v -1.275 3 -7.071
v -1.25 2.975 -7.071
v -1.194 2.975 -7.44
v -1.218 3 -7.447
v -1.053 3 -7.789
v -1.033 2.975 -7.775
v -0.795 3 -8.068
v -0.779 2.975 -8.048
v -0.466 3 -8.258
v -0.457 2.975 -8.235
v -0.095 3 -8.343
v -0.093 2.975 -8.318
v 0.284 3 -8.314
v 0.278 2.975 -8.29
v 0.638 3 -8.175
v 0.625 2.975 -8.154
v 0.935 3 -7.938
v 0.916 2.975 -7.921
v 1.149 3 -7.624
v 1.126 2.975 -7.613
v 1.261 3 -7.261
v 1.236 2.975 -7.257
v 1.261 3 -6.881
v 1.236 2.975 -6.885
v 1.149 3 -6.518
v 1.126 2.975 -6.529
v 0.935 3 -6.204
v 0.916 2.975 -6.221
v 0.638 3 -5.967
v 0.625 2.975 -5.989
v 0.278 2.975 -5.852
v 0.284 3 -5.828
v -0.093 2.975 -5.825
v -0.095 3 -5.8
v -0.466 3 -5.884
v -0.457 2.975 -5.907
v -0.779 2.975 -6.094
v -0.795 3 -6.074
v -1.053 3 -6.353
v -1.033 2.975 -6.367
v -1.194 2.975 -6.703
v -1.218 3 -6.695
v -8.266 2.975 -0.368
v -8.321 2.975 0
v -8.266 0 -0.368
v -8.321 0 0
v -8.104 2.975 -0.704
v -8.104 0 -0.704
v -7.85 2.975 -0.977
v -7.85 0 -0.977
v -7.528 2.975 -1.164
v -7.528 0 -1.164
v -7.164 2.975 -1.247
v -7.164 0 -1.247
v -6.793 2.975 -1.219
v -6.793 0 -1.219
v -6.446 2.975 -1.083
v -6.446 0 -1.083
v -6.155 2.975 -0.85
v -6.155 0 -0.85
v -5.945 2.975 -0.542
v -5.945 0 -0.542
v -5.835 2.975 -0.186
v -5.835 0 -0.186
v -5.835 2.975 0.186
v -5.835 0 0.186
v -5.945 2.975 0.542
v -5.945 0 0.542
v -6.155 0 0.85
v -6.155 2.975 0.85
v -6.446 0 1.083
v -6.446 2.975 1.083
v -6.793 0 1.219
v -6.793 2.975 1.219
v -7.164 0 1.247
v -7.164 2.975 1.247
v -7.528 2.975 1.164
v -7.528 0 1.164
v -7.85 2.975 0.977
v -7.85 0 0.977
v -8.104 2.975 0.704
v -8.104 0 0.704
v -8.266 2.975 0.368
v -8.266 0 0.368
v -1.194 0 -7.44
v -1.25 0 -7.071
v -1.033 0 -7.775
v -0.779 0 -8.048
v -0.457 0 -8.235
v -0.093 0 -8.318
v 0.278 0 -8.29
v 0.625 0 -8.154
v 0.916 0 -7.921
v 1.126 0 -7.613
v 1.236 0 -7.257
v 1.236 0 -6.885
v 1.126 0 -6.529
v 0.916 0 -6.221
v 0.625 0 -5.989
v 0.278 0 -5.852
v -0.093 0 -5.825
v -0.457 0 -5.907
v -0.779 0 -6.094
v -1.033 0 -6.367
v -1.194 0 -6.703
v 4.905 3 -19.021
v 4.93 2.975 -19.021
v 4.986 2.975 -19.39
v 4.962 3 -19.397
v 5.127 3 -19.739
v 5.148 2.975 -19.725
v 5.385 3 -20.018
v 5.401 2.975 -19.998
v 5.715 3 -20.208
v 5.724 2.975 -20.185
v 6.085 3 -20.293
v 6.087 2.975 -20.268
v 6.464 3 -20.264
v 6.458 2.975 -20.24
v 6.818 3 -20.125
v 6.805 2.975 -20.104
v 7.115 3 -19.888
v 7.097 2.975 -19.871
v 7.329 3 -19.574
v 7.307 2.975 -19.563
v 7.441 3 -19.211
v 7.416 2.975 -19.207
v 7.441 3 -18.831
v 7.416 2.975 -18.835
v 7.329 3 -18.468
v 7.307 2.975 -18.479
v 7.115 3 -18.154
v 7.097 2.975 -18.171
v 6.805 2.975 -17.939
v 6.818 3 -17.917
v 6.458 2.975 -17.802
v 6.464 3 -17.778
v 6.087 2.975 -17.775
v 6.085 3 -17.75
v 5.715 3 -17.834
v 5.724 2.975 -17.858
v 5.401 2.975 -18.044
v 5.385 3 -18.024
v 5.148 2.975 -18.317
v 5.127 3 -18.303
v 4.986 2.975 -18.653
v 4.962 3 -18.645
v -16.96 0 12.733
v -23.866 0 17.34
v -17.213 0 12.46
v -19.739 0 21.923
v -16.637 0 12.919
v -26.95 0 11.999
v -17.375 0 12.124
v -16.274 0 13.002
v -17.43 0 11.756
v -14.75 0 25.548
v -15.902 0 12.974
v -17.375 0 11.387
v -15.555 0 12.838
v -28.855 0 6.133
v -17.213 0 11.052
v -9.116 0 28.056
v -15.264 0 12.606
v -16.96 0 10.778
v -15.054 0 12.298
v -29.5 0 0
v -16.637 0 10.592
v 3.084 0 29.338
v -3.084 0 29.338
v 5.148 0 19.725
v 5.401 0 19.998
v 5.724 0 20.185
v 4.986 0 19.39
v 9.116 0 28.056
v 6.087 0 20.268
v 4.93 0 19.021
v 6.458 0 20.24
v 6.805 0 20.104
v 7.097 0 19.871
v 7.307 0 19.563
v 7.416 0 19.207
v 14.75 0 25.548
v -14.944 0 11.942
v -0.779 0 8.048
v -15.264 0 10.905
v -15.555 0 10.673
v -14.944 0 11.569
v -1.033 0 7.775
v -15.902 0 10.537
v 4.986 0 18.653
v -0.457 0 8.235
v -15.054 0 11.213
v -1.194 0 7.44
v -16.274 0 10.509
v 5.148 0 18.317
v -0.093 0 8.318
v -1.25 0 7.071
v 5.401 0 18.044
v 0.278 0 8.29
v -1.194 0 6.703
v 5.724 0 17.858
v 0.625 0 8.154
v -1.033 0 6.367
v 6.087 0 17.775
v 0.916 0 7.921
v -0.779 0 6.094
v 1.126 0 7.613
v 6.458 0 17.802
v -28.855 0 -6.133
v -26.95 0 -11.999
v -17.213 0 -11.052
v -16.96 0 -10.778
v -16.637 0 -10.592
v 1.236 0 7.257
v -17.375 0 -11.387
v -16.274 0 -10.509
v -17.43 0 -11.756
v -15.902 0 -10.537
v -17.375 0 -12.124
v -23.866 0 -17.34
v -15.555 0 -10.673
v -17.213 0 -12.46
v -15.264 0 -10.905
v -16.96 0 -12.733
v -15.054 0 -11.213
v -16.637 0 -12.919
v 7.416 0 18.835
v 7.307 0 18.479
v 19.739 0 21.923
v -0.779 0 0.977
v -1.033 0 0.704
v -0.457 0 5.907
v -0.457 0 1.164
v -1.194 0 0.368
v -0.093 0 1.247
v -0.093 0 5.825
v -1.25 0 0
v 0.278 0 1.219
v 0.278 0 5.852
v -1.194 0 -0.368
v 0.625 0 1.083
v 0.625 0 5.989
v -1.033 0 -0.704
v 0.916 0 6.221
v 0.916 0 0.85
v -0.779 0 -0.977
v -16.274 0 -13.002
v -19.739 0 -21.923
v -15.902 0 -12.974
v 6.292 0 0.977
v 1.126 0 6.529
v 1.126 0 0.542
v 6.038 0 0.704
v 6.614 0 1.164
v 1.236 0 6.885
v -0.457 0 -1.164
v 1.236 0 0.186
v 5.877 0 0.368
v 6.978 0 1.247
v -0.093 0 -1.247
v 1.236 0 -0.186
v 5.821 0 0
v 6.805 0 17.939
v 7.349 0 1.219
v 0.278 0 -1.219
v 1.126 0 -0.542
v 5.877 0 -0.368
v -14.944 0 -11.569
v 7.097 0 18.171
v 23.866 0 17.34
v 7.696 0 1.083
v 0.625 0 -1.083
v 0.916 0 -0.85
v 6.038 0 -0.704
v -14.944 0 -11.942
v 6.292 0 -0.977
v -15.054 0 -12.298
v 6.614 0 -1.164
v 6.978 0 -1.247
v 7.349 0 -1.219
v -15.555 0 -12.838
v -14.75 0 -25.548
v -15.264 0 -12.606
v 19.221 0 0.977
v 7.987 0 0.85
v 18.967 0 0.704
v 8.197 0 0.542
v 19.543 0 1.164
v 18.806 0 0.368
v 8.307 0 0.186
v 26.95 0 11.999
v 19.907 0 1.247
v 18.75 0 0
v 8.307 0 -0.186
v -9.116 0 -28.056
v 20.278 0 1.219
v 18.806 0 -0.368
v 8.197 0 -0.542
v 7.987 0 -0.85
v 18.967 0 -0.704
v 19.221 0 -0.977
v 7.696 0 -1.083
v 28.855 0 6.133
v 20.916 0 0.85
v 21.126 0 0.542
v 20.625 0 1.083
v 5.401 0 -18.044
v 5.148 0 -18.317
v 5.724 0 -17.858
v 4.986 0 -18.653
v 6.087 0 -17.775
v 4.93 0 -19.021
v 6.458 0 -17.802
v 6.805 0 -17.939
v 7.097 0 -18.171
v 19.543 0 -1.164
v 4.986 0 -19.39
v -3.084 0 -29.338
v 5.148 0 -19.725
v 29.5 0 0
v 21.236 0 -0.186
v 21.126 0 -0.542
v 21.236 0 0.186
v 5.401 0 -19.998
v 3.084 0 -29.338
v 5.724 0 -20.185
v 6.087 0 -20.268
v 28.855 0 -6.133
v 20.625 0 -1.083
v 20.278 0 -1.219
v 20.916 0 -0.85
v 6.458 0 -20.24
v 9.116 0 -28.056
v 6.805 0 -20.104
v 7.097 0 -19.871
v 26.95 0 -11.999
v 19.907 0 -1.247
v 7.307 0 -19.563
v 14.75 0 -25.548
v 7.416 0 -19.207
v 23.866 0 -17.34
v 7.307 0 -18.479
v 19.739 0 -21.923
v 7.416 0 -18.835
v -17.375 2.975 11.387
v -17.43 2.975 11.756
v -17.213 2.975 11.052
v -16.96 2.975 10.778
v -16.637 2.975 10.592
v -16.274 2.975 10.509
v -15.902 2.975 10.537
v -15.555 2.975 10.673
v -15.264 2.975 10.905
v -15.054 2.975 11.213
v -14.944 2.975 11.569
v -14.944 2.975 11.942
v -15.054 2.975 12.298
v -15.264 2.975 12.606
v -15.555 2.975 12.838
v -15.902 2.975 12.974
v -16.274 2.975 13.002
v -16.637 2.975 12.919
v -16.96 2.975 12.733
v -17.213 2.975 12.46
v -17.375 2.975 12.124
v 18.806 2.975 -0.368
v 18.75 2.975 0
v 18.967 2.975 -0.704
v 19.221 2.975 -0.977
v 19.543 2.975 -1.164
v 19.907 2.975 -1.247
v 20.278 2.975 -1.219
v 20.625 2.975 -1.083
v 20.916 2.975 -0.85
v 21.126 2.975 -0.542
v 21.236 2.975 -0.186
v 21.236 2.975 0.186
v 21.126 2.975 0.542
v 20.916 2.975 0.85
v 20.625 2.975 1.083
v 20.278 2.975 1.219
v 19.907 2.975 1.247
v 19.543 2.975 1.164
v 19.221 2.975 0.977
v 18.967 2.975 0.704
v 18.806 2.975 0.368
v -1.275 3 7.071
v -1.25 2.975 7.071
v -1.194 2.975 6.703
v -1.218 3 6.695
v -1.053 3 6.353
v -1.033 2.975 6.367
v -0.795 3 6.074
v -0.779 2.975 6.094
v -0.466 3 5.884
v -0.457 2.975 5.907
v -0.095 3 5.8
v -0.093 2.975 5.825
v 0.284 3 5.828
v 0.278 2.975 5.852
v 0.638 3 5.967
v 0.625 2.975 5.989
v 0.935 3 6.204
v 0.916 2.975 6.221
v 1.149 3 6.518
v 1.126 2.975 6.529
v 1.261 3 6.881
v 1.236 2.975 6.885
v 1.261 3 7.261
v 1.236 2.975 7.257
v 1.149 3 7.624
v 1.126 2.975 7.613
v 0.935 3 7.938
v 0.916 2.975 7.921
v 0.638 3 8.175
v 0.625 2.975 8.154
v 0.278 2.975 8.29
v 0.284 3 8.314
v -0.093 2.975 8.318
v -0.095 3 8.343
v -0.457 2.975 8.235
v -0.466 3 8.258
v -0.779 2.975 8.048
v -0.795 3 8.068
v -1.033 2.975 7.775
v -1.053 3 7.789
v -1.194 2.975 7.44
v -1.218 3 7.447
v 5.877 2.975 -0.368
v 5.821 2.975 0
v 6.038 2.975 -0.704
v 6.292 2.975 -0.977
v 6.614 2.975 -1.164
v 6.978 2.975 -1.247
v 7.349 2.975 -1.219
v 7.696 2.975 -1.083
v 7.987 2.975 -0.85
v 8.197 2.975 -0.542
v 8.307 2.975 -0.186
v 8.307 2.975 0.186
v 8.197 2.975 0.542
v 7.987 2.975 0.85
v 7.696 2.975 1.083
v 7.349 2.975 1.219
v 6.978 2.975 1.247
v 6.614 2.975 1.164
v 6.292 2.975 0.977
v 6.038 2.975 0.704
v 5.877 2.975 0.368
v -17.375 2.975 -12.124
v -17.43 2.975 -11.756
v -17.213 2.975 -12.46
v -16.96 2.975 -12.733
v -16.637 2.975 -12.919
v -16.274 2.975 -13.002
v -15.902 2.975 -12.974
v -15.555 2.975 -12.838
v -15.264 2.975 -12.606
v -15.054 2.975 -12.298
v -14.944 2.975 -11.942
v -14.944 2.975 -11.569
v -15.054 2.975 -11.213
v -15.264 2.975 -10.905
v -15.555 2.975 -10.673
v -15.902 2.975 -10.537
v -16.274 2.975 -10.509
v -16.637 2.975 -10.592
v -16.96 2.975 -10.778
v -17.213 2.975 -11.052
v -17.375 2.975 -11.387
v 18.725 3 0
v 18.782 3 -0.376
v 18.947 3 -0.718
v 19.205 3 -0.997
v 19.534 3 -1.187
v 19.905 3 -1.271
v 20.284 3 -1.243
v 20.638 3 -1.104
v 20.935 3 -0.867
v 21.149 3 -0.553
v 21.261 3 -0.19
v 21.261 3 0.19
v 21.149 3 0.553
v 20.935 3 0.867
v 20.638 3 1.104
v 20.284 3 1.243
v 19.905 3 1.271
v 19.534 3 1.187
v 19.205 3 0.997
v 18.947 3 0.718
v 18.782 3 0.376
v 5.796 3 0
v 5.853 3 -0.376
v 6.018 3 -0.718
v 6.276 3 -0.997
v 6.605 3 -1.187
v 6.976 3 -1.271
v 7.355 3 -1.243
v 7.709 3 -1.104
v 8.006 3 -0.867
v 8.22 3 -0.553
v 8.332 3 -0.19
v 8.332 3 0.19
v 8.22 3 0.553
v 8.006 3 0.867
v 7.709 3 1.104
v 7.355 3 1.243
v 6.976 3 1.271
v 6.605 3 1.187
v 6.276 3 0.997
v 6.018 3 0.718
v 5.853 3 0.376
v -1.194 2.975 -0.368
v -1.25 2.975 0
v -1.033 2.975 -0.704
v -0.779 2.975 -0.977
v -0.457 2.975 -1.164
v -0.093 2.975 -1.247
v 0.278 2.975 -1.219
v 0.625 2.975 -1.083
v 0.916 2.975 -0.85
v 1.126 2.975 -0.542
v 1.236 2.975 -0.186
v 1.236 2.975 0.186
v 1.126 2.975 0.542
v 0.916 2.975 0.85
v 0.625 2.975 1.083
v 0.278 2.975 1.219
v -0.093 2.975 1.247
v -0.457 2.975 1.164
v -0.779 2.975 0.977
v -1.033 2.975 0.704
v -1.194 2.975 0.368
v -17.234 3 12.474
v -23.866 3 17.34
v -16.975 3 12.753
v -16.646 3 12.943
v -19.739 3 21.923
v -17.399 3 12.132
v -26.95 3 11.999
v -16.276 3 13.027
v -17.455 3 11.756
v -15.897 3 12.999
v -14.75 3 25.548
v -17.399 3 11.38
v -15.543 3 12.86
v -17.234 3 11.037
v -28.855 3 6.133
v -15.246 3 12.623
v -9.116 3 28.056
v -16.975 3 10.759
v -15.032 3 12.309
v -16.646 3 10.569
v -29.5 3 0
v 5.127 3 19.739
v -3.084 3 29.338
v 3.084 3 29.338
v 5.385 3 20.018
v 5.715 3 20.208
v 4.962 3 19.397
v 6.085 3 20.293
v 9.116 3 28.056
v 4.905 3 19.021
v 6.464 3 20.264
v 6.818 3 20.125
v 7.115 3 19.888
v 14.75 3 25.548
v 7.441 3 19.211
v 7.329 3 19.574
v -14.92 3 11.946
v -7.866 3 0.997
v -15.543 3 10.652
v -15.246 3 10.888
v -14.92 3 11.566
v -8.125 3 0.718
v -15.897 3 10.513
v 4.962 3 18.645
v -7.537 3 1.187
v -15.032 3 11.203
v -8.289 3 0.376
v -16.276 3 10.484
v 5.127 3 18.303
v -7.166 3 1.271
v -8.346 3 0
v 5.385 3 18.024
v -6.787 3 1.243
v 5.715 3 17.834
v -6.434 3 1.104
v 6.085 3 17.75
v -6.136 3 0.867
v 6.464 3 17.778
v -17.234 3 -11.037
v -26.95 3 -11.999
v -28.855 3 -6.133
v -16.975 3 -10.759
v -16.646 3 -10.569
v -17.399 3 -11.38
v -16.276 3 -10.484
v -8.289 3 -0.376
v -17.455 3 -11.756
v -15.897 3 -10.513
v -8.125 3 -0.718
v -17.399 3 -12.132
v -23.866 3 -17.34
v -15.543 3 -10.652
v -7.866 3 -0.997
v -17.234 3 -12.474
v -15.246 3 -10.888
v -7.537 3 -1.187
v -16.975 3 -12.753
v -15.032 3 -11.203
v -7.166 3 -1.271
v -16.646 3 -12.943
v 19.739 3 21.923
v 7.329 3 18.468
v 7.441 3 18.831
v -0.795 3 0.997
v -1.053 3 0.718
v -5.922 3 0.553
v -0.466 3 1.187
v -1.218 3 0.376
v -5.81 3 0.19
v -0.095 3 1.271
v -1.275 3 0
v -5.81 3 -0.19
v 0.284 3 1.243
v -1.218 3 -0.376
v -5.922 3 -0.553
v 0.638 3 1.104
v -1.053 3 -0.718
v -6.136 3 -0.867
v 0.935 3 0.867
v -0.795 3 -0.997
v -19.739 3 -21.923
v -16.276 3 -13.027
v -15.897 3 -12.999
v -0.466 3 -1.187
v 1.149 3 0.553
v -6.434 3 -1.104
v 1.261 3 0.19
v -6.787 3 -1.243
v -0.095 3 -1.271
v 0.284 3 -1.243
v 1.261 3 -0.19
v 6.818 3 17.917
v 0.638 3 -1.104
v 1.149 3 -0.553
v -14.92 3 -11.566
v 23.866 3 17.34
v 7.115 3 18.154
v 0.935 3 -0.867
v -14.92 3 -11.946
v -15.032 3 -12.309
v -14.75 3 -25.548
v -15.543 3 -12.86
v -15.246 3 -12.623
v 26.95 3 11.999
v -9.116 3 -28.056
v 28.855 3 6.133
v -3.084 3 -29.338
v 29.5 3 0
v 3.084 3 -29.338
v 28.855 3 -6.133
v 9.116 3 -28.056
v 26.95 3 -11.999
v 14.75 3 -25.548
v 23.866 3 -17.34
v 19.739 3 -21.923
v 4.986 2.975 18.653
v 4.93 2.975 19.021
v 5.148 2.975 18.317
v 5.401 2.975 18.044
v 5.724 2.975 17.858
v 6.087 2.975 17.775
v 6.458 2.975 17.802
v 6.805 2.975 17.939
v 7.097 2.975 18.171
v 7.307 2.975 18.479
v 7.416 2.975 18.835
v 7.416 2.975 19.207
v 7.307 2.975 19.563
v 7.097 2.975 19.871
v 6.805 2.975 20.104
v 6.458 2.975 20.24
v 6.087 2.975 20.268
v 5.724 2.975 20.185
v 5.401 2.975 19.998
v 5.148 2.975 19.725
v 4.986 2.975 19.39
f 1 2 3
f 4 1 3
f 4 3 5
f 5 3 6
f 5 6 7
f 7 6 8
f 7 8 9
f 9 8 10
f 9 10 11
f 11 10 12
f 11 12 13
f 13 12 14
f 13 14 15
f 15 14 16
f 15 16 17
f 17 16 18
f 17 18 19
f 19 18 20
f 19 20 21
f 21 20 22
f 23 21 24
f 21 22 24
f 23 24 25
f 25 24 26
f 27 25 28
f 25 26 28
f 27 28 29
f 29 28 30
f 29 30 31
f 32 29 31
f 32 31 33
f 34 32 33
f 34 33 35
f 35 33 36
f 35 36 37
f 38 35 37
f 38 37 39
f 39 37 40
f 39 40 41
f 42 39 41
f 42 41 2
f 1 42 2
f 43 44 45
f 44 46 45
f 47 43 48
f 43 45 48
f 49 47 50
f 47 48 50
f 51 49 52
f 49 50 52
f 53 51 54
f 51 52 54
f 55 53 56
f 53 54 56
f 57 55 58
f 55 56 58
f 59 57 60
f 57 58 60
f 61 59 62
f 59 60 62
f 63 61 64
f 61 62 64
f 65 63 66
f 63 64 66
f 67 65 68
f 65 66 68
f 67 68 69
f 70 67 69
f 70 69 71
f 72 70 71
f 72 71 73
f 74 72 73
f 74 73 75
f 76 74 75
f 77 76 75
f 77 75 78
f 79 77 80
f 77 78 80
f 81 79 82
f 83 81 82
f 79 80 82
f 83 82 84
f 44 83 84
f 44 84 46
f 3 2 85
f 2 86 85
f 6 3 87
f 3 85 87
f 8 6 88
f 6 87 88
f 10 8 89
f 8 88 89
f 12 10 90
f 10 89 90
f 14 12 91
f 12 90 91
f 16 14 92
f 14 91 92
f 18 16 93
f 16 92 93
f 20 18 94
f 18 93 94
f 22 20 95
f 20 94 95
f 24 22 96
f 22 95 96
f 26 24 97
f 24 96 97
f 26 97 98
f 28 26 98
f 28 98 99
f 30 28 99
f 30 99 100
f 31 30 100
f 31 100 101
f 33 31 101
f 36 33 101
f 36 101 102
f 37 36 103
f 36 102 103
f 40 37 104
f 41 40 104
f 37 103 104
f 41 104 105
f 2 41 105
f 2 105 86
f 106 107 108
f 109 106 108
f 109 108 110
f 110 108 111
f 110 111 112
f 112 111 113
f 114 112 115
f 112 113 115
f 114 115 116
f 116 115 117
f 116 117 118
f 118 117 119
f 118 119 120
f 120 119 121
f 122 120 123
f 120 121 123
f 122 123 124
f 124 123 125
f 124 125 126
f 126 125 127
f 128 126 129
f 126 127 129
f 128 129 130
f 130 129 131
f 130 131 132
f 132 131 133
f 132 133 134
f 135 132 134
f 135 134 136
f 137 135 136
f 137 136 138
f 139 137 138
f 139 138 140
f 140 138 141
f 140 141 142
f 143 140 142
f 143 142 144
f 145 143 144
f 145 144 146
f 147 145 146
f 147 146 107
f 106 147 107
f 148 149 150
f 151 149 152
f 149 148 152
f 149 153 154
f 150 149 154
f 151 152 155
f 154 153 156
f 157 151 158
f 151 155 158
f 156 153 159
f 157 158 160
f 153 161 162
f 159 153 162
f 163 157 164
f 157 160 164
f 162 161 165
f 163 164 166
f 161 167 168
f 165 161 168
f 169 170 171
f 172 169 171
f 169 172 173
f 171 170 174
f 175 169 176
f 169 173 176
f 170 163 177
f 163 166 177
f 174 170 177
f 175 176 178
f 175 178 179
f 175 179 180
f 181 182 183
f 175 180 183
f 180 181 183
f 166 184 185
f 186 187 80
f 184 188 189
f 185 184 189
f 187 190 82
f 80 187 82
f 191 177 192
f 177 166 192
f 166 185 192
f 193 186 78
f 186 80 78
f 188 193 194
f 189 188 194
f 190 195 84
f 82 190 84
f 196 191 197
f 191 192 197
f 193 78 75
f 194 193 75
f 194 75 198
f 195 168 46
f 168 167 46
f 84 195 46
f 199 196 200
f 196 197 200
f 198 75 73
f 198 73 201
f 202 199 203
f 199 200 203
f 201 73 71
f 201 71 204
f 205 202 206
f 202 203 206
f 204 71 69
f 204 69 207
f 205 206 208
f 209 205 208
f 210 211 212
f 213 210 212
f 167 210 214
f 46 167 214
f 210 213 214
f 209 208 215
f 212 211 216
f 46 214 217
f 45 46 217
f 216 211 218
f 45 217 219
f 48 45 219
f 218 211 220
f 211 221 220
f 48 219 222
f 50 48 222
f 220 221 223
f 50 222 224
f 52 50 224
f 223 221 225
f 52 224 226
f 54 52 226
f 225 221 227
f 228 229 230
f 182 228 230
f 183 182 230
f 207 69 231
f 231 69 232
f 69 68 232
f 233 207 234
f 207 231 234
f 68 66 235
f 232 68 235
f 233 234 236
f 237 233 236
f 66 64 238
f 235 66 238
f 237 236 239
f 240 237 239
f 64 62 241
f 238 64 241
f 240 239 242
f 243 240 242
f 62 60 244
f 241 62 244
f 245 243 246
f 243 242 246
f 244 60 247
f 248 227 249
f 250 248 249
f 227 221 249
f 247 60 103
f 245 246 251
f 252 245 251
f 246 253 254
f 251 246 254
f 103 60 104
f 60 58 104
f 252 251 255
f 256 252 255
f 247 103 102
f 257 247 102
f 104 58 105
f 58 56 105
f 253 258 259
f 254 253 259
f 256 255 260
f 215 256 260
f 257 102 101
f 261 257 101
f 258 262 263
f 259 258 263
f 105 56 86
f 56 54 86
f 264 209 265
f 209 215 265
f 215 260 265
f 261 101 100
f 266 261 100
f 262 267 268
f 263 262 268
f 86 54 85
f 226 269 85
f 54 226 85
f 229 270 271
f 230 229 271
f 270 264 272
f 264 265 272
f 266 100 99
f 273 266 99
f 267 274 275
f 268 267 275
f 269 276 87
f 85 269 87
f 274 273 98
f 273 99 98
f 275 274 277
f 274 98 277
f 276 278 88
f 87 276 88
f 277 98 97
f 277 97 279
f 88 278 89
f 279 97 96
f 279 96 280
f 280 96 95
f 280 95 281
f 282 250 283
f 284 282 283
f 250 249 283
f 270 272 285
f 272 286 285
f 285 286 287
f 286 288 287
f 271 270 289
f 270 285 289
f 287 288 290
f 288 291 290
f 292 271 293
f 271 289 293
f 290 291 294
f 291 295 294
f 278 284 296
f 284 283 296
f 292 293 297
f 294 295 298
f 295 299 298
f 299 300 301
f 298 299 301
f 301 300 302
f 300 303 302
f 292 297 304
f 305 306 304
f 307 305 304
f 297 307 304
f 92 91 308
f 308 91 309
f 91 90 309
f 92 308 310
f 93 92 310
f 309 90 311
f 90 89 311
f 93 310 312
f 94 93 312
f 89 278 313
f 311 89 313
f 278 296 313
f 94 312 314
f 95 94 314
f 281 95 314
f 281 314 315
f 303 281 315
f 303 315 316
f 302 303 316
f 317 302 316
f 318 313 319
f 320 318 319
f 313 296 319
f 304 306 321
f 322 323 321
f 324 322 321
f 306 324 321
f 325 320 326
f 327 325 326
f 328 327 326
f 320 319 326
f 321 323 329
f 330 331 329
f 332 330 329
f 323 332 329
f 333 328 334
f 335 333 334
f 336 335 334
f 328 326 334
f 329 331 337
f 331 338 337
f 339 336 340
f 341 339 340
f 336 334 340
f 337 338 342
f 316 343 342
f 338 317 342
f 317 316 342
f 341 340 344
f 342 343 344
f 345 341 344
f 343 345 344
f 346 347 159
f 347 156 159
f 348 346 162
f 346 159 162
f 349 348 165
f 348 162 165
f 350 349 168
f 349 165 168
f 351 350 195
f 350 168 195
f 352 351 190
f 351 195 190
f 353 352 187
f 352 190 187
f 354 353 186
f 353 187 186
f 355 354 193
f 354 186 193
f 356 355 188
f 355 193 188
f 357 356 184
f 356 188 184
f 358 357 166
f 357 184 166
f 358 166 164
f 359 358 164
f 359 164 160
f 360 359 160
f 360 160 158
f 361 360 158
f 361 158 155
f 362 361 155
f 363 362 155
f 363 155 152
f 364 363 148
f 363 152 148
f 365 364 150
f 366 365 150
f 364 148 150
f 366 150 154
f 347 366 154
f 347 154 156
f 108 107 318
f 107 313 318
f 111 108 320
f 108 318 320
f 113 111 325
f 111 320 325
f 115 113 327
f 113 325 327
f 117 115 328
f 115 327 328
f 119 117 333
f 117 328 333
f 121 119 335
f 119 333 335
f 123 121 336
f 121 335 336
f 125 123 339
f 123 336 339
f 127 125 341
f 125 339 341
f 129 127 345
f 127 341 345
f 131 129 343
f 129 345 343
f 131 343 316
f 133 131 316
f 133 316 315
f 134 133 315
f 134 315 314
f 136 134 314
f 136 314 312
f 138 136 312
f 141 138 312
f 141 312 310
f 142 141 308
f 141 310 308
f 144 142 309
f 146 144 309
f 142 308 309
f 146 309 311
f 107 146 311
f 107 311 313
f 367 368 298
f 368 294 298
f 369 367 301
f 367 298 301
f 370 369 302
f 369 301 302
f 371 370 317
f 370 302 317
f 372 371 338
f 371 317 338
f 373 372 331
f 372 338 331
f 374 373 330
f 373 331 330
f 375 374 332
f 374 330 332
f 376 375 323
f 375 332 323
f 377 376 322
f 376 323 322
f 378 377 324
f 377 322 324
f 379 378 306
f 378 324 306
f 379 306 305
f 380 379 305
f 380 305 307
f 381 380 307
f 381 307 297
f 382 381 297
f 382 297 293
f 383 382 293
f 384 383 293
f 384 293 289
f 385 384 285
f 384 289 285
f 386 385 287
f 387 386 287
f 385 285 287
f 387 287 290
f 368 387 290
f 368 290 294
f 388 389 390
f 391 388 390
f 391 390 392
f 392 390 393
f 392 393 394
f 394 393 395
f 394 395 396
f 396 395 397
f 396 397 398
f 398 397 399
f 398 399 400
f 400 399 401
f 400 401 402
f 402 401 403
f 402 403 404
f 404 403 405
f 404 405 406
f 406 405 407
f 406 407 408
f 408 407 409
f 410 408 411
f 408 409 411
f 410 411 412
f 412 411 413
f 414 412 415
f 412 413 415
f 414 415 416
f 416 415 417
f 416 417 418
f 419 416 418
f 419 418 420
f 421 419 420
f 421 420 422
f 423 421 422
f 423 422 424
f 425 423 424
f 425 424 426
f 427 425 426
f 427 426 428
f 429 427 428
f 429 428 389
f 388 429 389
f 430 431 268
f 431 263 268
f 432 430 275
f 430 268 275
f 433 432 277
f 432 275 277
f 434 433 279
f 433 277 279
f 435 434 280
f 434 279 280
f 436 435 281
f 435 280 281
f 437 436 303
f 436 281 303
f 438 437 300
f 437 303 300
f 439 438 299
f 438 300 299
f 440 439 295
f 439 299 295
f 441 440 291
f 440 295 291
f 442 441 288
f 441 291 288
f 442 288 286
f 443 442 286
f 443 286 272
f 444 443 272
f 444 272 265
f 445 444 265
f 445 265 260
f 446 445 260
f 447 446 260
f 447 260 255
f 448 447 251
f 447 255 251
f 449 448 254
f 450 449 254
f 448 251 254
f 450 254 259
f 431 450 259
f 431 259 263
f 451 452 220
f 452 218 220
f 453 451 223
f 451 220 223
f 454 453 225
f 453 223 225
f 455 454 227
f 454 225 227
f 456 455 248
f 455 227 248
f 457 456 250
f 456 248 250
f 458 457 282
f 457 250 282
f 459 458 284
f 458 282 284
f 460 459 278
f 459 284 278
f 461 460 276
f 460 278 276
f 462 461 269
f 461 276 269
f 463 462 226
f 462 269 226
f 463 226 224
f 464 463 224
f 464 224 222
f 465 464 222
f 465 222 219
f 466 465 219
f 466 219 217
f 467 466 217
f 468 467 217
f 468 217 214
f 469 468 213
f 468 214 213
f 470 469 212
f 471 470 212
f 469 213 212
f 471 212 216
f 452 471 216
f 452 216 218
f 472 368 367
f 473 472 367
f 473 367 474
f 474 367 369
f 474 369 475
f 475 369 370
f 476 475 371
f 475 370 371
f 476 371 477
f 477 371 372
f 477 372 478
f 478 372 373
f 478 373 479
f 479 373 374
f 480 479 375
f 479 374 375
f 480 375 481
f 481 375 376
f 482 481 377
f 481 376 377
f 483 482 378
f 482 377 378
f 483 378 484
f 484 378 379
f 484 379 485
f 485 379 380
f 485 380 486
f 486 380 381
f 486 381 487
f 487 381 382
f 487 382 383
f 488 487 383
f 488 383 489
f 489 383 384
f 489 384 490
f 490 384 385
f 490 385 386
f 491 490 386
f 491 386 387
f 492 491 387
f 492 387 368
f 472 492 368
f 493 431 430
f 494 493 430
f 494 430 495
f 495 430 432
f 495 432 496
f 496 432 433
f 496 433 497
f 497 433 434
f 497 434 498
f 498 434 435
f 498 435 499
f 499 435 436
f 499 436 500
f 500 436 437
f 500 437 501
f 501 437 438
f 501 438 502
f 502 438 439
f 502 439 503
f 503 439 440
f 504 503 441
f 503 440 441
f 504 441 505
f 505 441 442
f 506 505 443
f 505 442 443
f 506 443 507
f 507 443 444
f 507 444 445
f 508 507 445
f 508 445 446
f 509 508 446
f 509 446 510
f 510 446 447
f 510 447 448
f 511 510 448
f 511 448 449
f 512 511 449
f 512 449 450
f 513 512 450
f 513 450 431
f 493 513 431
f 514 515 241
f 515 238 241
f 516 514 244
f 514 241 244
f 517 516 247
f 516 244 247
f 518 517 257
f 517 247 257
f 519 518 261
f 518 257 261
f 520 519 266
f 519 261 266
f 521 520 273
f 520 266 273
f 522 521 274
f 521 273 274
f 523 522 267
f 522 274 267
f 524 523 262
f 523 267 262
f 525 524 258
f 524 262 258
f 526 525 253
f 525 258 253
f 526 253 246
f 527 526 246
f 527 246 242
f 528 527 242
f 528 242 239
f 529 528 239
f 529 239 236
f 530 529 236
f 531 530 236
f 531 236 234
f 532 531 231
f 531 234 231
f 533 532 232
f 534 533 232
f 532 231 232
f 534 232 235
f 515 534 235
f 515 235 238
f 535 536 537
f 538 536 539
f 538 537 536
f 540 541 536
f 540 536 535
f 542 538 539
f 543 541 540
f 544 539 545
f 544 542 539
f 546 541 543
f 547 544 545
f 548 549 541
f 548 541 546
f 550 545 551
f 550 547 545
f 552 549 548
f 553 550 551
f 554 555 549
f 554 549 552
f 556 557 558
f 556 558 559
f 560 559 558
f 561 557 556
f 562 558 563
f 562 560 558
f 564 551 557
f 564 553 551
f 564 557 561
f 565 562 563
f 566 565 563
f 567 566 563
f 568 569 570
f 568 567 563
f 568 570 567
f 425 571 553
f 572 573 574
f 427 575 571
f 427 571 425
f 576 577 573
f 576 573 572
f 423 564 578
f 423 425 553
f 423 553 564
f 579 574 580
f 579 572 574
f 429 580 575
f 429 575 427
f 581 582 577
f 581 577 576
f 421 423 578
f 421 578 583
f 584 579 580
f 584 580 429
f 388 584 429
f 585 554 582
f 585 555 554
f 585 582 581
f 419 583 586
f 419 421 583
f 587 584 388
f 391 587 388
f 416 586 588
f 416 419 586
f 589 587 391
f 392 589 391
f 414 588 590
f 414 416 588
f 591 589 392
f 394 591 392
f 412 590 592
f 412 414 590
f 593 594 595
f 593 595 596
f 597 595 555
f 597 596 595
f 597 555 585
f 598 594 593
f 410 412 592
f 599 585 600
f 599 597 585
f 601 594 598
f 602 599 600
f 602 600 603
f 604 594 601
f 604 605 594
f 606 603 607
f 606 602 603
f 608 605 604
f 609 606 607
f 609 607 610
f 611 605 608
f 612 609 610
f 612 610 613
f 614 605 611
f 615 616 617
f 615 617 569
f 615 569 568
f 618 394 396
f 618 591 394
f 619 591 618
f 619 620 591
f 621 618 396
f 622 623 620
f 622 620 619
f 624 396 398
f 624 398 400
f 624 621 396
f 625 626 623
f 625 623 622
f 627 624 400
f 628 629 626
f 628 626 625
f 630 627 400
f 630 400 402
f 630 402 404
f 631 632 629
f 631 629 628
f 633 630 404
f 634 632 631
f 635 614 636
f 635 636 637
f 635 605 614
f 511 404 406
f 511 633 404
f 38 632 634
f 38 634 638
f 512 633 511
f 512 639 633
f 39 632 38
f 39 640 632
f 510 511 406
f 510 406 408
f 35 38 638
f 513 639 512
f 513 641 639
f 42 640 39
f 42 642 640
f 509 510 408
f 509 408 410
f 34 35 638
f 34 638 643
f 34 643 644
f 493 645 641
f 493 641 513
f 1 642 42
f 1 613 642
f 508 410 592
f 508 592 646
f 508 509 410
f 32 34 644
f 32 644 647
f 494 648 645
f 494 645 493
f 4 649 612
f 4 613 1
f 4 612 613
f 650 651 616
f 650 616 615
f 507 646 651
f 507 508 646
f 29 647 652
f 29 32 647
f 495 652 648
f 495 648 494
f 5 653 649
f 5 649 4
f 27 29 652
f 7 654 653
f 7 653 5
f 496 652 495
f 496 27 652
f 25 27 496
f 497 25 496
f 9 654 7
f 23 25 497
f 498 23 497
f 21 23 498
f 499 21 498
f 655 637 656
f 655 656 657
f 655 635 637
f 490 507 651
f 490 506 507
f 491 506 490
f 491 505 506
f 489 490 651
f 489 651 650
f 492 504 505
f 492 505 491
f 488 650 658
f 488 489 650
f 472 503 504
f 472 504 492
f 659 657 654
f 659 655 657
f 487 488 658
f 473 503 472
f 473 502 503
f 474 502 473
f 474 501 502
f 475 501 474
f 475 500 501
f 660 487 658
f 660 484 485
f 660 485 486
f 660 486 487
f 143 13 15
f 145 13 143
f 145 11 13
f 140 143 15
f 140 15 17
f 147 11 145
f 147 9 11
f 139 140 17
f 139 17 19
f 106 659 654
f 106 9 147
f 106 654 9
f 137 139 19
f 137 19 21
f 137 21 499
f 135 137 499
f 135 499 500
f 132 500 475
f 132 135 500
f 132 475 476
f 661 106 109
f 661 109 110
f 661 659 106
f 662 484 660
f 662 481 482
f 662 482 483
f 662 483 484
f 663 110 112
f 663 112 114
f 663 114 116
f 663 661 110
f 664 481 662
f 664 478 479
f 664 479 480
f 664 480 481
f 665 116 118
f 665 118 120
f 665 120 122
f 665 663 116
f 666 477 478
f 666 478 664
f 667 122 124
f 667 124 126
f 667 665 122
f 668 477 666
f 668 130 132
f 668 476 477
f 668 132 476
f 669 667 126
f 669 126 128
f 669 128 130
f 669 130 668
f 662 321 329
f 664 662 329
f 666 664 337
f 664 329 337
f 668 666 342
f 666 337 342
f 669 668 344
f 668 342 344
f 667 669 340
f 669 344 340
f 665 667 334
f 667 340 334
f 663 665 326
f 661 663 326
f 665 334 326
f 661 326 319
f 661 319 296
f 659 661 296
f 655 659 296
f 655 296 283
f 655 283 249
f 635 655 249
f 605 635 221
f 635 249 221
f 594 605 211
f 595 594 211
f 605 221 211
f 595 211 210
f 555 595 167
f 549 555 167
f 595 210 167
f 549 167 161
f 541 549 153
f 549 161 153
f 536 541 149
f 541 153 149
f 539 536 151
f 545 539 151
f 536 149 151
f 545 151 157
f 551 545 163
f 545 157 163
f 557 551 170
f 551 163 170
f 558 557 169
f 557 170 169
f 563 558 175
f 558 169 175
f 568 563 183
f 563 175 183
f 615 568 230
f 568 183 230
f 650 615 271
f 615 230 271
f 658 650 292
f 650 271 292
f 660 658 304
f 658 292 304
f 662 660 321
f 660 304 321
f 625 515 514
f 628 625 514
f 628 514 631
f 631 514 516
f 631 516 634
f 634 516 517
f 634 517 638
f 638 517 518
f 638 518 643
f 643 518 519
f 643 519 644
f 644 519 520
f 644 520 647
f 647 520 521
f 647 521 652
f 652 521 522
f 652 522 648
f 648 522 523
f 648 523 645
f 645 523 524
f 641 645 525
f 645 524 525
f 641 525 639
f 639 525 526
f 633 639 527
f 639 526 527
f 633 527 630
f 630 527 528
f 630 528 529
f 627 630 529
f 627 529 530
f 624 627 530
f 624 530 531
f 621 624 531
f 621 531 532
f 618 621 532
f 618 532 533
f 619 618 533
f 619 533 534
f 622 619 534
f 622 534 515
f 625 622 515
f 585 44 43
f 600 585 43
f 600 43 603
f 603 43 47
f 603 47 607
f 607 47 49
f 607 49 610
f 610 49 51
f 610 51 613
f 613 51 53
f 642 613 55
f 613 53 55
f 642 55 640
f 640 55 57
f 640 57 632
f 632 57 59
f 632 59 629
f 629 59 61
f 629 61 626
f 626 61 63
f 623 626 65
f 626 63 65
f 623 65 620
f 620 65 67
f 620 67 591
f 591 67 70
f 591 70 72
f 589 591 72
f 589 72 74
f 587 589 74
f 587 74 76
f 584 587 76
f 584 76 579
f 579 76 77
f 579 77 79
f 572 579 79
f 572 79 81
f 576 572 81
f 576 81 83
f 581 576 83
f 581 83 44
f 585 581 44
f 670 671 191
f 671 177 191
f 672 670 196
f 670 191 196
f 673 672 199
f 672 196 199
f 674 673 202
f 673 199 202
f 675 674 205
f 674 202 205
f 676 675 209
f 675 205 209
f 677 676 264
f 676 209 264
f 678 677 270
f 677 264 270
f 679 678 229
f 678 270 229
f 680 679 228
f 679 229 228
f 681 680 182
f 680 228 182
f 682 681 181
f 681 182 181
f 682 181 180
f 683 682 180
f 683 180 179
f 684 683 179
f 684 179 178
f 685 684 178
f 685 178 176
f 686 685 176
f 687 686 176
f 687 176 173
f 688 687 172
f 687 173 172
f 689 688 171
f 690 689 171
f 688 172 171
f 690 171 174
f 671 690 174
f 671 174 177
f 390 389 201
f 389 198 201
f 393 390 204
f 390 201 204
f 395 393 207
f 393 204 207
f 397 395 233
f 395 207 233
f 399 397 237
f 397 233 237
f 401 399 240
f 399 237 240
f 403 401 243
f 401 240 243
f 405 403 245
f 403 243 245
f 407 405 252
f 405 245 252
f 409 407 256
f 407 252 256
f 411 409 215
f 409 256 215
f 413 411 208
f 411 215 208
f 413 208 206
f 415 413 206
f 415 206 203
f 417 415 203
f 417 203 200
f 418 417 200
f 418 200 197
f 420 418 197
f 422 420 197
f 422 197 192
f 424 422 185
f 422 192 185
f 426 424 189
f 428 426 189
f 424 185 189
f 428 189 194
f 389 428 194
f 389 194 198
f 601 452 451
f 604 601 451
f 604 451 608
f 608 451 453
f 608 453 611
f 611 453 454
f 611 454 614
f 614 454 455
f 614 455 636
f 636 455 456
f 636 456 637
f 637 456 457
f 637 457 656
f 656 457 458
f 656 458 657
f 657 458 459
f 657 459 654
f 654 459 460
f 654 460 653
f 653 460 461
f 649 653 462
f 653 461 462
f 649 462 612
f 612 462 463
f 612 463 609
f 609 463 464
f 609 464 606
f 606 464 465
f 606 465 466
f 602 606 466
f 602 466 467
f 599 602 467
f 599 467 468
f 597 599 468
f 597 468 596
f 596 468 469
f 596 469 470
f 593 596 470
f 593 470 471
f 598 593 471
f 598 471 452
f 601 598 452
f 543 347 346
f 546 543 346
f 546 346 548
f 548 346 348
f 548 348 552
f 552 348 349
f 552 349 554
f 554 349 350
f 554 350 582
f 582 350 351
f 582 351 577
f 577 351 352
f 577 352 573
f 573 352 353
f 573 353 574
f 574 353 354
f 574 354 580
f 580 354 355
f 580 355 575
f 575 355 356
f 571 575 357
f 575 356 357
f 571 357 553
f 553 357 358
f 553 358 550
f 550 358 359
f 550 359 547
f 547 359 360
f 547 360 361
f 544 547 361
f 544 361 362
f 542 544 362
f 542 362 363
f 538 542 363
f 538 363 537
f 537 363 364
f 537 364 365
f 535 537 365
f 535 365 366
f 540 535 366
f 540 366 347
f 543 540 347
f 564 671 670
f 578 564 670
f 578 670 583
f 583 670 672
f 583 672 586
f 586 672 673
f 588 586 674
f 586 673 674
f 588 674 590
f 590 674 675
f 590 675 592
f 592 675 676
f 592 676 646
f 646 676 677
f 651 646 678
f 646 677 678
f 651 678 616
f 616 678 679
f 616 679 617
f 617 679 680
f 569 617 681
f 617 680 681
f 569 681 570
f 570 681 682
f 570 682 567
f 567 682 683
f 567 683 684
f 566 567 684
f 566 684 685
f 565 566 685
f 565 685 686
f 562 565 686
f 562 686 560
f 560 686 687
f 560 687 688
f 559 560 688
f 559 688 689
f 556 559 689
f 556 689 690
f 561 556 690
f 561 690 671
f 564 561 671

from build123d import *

# Parameters (mm, degrees)
SKETCH_1_R                   = 29.5
EXTRUDE_1_DEPTH              = 3
HOLE_WIZARD_M3_1_D           = 2.5
HOLE_WIZARD_M3_1_CSINK_D     = 2.55
HOLE_WIZARD_M3_1_CSINK_ANGLE = 90
HOLE_WIZARD_M3_2_D           = 2.5
HOLE_WIZARD_M3_2_CSINK_D     = 2.55
HOLE_WIZARD_M3_2_CSINK_ANGLE = 90


with BuildPart() as part:
    # 草图1 → 凸台-拉伸1 (new body)
    with BuildSketch(Plane(origin=(0, 0, 0), x_dir=(1, 0, 0), z_dir=(0, 1, 0))):
        Circle(SKETCH_1_R)
    extrude(amount=EXTRUDE_1_DEPTH)

    # M3 螺纹孔的螺纹孔钻头1 (through all)
    with Locations(Plane(origin=(0, 3, 0), x_dir=(1, 0, 0), z_dir=(0, 1, 0))):
        with Locations((6.180339887, 19.021130326), (20, 0), (6.180339887, -19.021130326), (-16.180339887, -11.755705046), (-16.180339887, 11.755705046)):
            CounterSinkHole(HOLE_WIZARD_M3_1_D / 2, HOLE_WIZARD_M3_1_CSINK_D / 2, counter_sink_angle=HOLE_WIZARD_M3_1_CSINK_ANGLE)

    # M3 螺纹孔的螺纹孔钻头2 (through all)
    with Locations(Plane(origin=(0, 3, 0), x_dir=(1, 0, 0), z_dir=(0, 1, 0))):
        with Locations((0, 0), (7.071067812, 0), (0, -7.071067812), (-7.071067812, 0), (0, 7.071067812)):
            CounterSinkHole(HOLE_WIZARD_M3_2_D / 2, HOLE_WIZARD_M3_2_CSINK_D / 2, counter_sink_angle=HOLE_WIZARD_M3_2_CSINK_ANGLE)


solid = part.part
